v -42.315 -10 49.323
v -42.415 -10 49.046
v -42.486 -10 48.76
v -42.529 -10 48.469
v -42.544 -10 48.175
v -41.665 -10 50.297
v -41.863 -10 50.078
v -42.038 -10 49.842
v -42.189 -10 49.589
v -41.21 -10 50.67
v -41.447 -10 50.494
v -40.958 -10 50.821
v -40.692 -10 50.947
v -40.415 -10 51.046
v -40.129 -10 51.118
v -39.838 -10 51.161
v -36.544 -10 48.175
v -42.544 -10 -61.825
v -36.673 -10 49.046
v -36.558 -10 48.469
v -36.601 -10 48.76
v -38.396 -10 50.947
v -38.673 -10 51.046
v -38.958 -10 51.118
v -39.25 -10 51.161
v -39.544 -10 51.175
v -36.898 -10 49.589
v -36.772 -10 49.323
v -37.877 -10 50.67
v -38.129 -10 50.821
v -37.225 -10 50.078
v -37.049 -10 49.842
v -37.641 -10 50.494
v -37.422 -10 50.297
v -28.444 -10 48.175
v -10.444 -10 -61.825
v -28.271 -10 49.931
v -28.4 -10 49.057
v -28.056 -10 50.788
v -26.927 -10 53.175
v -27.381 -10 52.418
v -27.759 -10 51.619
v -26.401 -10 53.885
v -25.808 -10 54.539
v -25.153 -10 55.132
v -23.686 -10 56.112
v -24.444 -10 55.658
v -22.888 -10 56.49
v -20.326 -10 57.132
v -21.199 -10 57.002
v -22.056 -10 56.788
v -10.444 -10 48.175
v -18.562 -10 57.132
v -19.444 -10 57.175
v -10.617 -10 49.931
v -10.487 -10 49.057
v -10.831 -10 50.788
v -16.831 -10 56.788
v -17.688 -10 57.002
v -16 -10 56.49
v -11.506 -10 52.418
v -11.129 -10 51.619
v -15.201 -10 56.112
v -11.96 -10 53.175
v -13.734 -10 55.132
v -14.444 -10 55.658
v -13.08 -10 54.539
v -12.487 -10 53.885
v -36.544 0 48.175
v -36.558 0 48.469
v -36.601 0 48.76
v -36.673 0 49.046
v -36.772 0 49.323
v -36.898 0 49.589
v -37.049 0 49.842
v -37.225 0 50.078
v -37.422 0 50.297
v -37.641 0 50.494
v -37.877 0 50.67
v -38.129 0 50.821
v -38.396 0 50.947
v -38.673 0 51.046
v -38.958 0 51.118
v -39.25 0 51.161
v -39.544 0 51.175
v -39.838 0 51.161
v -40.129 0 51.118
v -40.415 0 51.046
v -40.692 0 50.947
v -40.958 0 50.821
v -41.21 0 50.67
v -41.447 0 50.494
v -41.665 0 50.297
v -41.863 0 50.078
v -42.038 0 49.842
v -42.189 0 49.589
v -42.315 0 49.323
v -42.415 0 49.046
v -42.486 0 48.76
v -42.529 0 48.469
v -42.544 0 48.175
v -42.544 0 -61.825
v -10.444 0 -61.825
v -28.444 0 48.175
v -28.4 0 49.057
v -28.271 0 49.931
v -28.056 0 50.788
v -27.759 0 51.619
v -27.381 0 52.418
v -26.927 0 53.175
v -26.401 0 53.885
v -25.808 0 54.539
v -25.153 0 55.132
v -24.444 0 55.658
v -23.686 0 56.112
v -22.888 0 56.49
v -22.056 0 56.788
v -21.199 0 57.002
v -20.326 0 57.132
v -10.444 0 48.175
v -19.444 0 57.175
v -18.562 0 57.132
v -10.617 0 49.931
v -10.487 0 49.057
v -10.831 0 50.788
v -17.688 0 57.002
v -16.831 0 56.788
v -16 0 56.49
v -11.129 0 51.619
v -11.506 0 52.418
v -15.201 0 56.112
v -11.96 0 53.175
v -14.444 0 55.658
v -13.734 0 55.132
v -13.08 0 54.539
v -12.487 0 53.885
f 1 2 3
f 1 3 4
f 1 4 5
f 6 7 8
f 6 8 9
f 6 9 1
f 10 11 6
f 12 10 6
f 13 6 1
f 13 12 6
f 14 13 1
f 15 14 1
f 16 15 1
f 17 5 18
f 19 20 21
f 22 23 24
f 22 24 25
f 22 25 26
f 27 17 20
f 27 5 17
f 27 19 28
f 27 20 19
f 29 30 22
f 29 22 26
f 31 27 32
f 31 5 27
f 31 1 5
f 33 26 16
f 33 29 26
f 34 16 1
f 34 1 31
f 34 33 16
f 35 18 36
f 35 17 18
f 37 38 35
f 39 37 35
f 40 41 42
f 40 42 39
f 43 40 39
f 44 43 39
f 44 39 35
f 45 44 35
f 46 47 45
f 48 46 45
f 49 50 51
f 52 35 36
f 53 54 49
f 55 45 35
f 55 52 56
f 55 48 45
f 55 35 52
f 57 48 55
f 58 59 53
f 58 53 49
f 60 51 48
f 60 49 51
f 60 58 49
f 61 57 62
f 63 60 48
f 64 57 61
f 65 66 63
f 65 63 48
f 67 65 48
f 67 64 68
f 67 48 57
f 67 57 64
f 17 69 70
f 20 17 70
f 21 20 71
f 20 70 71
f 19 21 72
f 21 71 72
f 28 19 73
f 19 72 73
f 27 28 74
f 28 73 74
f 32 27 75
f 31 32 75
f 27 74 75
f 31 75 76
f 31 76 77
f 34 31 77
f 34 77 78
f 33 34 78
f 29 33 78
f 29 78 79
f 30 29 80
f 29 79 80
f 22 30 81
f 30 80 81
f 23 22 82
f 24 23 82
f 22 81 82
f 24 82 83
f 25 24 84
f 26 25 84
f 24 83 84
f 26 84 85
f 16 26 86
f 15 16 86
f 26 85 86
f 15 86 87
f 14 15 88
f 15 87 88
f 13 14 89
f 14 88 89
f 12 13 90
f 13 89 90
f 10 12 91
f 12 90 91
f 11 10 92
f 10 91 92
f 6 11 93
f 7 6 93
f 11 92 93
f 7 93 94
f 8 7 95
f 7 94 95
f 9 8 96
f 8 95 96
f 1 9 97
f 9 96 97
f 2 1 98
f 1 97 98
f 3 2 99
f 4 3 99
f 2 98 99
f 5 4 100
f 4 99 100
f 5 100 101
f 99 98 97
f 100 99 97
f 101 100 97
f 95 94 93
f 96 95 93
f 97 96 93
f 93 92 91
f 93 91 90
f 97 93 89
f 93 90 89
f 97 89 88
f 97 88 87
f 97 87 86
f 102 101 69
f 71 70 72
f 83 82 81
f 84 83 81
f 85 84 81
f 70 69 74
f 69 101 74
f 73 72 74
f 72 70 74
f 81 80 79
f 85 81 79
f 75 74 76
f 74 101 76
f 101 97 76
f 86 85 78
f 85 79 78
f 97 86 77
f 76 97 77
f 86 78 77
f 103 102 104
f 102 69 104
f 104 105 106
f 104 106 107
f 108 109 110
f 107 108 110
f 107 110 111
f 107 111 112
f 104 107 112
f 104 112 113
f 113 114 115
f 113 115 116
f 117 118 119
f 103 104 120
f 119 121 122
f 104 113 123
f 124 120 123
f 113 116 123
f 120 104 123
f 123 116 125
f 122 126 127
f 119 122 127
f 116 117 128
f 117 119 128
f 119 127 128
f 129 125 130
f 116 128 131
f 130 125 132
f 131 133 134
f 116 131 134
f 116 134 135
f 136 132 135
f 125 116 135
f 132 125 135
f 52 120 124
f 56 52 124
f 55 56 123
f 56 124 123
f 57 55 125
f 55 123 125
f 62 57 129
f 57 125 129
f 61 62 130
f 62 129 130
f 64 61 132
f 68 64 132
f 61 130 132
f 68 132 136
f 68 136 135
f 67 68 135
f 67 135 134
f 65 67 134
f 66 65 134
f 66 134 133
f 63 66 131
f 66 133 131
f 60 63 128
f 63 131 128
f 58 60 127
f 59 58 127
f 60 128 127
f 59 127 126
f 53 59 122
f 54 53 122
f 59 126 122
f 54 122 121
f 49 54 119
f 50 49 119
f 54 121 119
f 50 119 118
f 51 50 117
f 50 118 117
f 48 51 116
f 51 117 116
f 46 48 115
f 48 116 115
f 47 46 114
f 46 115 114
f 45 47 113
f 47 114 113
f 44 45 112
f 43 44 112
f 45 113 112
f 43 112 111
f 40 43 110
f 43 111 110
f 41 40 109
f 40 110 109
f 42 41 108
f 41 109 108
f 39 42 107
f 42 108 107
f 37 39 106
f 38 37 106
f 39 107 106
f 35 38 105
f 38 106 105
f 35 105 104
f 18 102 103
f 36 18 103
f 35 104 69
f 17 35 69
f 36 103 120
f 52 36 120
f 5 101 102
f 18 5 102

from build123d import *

# Parameters (mm, degrees)
F1_DEPTH = 10


with BuildPart() as f1:
    # F0 (on Front) → F1 (new body)
    with BuildSketch(Plane.XZ):
        with BuildLine():
            ThreePointArc((-36.543683, 48.175188), (-39.543683, 51.175188), (-42.543683, 48.175188))
            Line((-42.543683, 48.175188), (-36.543683, 48.175188))
        make_face()
        with BuildLine():
            ThreePointArc((-10.443683, 48.175188), (-19.443683, 57.175188), (-28.443683, 48.175188))
            Line((-28.443683, 48.175188), (-10.443683, 48.175188))
        make_face()
        Polygon((-36.543683, 48.175188), (-42.543683, 48.175188), (-42.543683, -61.824812), (-10.443683, -61.824812), (-10.443683, 48.175188), (-28.443683, 48.175188), align=None)
    extrude(amount=F1_DEPTH)


solid = f1.part
